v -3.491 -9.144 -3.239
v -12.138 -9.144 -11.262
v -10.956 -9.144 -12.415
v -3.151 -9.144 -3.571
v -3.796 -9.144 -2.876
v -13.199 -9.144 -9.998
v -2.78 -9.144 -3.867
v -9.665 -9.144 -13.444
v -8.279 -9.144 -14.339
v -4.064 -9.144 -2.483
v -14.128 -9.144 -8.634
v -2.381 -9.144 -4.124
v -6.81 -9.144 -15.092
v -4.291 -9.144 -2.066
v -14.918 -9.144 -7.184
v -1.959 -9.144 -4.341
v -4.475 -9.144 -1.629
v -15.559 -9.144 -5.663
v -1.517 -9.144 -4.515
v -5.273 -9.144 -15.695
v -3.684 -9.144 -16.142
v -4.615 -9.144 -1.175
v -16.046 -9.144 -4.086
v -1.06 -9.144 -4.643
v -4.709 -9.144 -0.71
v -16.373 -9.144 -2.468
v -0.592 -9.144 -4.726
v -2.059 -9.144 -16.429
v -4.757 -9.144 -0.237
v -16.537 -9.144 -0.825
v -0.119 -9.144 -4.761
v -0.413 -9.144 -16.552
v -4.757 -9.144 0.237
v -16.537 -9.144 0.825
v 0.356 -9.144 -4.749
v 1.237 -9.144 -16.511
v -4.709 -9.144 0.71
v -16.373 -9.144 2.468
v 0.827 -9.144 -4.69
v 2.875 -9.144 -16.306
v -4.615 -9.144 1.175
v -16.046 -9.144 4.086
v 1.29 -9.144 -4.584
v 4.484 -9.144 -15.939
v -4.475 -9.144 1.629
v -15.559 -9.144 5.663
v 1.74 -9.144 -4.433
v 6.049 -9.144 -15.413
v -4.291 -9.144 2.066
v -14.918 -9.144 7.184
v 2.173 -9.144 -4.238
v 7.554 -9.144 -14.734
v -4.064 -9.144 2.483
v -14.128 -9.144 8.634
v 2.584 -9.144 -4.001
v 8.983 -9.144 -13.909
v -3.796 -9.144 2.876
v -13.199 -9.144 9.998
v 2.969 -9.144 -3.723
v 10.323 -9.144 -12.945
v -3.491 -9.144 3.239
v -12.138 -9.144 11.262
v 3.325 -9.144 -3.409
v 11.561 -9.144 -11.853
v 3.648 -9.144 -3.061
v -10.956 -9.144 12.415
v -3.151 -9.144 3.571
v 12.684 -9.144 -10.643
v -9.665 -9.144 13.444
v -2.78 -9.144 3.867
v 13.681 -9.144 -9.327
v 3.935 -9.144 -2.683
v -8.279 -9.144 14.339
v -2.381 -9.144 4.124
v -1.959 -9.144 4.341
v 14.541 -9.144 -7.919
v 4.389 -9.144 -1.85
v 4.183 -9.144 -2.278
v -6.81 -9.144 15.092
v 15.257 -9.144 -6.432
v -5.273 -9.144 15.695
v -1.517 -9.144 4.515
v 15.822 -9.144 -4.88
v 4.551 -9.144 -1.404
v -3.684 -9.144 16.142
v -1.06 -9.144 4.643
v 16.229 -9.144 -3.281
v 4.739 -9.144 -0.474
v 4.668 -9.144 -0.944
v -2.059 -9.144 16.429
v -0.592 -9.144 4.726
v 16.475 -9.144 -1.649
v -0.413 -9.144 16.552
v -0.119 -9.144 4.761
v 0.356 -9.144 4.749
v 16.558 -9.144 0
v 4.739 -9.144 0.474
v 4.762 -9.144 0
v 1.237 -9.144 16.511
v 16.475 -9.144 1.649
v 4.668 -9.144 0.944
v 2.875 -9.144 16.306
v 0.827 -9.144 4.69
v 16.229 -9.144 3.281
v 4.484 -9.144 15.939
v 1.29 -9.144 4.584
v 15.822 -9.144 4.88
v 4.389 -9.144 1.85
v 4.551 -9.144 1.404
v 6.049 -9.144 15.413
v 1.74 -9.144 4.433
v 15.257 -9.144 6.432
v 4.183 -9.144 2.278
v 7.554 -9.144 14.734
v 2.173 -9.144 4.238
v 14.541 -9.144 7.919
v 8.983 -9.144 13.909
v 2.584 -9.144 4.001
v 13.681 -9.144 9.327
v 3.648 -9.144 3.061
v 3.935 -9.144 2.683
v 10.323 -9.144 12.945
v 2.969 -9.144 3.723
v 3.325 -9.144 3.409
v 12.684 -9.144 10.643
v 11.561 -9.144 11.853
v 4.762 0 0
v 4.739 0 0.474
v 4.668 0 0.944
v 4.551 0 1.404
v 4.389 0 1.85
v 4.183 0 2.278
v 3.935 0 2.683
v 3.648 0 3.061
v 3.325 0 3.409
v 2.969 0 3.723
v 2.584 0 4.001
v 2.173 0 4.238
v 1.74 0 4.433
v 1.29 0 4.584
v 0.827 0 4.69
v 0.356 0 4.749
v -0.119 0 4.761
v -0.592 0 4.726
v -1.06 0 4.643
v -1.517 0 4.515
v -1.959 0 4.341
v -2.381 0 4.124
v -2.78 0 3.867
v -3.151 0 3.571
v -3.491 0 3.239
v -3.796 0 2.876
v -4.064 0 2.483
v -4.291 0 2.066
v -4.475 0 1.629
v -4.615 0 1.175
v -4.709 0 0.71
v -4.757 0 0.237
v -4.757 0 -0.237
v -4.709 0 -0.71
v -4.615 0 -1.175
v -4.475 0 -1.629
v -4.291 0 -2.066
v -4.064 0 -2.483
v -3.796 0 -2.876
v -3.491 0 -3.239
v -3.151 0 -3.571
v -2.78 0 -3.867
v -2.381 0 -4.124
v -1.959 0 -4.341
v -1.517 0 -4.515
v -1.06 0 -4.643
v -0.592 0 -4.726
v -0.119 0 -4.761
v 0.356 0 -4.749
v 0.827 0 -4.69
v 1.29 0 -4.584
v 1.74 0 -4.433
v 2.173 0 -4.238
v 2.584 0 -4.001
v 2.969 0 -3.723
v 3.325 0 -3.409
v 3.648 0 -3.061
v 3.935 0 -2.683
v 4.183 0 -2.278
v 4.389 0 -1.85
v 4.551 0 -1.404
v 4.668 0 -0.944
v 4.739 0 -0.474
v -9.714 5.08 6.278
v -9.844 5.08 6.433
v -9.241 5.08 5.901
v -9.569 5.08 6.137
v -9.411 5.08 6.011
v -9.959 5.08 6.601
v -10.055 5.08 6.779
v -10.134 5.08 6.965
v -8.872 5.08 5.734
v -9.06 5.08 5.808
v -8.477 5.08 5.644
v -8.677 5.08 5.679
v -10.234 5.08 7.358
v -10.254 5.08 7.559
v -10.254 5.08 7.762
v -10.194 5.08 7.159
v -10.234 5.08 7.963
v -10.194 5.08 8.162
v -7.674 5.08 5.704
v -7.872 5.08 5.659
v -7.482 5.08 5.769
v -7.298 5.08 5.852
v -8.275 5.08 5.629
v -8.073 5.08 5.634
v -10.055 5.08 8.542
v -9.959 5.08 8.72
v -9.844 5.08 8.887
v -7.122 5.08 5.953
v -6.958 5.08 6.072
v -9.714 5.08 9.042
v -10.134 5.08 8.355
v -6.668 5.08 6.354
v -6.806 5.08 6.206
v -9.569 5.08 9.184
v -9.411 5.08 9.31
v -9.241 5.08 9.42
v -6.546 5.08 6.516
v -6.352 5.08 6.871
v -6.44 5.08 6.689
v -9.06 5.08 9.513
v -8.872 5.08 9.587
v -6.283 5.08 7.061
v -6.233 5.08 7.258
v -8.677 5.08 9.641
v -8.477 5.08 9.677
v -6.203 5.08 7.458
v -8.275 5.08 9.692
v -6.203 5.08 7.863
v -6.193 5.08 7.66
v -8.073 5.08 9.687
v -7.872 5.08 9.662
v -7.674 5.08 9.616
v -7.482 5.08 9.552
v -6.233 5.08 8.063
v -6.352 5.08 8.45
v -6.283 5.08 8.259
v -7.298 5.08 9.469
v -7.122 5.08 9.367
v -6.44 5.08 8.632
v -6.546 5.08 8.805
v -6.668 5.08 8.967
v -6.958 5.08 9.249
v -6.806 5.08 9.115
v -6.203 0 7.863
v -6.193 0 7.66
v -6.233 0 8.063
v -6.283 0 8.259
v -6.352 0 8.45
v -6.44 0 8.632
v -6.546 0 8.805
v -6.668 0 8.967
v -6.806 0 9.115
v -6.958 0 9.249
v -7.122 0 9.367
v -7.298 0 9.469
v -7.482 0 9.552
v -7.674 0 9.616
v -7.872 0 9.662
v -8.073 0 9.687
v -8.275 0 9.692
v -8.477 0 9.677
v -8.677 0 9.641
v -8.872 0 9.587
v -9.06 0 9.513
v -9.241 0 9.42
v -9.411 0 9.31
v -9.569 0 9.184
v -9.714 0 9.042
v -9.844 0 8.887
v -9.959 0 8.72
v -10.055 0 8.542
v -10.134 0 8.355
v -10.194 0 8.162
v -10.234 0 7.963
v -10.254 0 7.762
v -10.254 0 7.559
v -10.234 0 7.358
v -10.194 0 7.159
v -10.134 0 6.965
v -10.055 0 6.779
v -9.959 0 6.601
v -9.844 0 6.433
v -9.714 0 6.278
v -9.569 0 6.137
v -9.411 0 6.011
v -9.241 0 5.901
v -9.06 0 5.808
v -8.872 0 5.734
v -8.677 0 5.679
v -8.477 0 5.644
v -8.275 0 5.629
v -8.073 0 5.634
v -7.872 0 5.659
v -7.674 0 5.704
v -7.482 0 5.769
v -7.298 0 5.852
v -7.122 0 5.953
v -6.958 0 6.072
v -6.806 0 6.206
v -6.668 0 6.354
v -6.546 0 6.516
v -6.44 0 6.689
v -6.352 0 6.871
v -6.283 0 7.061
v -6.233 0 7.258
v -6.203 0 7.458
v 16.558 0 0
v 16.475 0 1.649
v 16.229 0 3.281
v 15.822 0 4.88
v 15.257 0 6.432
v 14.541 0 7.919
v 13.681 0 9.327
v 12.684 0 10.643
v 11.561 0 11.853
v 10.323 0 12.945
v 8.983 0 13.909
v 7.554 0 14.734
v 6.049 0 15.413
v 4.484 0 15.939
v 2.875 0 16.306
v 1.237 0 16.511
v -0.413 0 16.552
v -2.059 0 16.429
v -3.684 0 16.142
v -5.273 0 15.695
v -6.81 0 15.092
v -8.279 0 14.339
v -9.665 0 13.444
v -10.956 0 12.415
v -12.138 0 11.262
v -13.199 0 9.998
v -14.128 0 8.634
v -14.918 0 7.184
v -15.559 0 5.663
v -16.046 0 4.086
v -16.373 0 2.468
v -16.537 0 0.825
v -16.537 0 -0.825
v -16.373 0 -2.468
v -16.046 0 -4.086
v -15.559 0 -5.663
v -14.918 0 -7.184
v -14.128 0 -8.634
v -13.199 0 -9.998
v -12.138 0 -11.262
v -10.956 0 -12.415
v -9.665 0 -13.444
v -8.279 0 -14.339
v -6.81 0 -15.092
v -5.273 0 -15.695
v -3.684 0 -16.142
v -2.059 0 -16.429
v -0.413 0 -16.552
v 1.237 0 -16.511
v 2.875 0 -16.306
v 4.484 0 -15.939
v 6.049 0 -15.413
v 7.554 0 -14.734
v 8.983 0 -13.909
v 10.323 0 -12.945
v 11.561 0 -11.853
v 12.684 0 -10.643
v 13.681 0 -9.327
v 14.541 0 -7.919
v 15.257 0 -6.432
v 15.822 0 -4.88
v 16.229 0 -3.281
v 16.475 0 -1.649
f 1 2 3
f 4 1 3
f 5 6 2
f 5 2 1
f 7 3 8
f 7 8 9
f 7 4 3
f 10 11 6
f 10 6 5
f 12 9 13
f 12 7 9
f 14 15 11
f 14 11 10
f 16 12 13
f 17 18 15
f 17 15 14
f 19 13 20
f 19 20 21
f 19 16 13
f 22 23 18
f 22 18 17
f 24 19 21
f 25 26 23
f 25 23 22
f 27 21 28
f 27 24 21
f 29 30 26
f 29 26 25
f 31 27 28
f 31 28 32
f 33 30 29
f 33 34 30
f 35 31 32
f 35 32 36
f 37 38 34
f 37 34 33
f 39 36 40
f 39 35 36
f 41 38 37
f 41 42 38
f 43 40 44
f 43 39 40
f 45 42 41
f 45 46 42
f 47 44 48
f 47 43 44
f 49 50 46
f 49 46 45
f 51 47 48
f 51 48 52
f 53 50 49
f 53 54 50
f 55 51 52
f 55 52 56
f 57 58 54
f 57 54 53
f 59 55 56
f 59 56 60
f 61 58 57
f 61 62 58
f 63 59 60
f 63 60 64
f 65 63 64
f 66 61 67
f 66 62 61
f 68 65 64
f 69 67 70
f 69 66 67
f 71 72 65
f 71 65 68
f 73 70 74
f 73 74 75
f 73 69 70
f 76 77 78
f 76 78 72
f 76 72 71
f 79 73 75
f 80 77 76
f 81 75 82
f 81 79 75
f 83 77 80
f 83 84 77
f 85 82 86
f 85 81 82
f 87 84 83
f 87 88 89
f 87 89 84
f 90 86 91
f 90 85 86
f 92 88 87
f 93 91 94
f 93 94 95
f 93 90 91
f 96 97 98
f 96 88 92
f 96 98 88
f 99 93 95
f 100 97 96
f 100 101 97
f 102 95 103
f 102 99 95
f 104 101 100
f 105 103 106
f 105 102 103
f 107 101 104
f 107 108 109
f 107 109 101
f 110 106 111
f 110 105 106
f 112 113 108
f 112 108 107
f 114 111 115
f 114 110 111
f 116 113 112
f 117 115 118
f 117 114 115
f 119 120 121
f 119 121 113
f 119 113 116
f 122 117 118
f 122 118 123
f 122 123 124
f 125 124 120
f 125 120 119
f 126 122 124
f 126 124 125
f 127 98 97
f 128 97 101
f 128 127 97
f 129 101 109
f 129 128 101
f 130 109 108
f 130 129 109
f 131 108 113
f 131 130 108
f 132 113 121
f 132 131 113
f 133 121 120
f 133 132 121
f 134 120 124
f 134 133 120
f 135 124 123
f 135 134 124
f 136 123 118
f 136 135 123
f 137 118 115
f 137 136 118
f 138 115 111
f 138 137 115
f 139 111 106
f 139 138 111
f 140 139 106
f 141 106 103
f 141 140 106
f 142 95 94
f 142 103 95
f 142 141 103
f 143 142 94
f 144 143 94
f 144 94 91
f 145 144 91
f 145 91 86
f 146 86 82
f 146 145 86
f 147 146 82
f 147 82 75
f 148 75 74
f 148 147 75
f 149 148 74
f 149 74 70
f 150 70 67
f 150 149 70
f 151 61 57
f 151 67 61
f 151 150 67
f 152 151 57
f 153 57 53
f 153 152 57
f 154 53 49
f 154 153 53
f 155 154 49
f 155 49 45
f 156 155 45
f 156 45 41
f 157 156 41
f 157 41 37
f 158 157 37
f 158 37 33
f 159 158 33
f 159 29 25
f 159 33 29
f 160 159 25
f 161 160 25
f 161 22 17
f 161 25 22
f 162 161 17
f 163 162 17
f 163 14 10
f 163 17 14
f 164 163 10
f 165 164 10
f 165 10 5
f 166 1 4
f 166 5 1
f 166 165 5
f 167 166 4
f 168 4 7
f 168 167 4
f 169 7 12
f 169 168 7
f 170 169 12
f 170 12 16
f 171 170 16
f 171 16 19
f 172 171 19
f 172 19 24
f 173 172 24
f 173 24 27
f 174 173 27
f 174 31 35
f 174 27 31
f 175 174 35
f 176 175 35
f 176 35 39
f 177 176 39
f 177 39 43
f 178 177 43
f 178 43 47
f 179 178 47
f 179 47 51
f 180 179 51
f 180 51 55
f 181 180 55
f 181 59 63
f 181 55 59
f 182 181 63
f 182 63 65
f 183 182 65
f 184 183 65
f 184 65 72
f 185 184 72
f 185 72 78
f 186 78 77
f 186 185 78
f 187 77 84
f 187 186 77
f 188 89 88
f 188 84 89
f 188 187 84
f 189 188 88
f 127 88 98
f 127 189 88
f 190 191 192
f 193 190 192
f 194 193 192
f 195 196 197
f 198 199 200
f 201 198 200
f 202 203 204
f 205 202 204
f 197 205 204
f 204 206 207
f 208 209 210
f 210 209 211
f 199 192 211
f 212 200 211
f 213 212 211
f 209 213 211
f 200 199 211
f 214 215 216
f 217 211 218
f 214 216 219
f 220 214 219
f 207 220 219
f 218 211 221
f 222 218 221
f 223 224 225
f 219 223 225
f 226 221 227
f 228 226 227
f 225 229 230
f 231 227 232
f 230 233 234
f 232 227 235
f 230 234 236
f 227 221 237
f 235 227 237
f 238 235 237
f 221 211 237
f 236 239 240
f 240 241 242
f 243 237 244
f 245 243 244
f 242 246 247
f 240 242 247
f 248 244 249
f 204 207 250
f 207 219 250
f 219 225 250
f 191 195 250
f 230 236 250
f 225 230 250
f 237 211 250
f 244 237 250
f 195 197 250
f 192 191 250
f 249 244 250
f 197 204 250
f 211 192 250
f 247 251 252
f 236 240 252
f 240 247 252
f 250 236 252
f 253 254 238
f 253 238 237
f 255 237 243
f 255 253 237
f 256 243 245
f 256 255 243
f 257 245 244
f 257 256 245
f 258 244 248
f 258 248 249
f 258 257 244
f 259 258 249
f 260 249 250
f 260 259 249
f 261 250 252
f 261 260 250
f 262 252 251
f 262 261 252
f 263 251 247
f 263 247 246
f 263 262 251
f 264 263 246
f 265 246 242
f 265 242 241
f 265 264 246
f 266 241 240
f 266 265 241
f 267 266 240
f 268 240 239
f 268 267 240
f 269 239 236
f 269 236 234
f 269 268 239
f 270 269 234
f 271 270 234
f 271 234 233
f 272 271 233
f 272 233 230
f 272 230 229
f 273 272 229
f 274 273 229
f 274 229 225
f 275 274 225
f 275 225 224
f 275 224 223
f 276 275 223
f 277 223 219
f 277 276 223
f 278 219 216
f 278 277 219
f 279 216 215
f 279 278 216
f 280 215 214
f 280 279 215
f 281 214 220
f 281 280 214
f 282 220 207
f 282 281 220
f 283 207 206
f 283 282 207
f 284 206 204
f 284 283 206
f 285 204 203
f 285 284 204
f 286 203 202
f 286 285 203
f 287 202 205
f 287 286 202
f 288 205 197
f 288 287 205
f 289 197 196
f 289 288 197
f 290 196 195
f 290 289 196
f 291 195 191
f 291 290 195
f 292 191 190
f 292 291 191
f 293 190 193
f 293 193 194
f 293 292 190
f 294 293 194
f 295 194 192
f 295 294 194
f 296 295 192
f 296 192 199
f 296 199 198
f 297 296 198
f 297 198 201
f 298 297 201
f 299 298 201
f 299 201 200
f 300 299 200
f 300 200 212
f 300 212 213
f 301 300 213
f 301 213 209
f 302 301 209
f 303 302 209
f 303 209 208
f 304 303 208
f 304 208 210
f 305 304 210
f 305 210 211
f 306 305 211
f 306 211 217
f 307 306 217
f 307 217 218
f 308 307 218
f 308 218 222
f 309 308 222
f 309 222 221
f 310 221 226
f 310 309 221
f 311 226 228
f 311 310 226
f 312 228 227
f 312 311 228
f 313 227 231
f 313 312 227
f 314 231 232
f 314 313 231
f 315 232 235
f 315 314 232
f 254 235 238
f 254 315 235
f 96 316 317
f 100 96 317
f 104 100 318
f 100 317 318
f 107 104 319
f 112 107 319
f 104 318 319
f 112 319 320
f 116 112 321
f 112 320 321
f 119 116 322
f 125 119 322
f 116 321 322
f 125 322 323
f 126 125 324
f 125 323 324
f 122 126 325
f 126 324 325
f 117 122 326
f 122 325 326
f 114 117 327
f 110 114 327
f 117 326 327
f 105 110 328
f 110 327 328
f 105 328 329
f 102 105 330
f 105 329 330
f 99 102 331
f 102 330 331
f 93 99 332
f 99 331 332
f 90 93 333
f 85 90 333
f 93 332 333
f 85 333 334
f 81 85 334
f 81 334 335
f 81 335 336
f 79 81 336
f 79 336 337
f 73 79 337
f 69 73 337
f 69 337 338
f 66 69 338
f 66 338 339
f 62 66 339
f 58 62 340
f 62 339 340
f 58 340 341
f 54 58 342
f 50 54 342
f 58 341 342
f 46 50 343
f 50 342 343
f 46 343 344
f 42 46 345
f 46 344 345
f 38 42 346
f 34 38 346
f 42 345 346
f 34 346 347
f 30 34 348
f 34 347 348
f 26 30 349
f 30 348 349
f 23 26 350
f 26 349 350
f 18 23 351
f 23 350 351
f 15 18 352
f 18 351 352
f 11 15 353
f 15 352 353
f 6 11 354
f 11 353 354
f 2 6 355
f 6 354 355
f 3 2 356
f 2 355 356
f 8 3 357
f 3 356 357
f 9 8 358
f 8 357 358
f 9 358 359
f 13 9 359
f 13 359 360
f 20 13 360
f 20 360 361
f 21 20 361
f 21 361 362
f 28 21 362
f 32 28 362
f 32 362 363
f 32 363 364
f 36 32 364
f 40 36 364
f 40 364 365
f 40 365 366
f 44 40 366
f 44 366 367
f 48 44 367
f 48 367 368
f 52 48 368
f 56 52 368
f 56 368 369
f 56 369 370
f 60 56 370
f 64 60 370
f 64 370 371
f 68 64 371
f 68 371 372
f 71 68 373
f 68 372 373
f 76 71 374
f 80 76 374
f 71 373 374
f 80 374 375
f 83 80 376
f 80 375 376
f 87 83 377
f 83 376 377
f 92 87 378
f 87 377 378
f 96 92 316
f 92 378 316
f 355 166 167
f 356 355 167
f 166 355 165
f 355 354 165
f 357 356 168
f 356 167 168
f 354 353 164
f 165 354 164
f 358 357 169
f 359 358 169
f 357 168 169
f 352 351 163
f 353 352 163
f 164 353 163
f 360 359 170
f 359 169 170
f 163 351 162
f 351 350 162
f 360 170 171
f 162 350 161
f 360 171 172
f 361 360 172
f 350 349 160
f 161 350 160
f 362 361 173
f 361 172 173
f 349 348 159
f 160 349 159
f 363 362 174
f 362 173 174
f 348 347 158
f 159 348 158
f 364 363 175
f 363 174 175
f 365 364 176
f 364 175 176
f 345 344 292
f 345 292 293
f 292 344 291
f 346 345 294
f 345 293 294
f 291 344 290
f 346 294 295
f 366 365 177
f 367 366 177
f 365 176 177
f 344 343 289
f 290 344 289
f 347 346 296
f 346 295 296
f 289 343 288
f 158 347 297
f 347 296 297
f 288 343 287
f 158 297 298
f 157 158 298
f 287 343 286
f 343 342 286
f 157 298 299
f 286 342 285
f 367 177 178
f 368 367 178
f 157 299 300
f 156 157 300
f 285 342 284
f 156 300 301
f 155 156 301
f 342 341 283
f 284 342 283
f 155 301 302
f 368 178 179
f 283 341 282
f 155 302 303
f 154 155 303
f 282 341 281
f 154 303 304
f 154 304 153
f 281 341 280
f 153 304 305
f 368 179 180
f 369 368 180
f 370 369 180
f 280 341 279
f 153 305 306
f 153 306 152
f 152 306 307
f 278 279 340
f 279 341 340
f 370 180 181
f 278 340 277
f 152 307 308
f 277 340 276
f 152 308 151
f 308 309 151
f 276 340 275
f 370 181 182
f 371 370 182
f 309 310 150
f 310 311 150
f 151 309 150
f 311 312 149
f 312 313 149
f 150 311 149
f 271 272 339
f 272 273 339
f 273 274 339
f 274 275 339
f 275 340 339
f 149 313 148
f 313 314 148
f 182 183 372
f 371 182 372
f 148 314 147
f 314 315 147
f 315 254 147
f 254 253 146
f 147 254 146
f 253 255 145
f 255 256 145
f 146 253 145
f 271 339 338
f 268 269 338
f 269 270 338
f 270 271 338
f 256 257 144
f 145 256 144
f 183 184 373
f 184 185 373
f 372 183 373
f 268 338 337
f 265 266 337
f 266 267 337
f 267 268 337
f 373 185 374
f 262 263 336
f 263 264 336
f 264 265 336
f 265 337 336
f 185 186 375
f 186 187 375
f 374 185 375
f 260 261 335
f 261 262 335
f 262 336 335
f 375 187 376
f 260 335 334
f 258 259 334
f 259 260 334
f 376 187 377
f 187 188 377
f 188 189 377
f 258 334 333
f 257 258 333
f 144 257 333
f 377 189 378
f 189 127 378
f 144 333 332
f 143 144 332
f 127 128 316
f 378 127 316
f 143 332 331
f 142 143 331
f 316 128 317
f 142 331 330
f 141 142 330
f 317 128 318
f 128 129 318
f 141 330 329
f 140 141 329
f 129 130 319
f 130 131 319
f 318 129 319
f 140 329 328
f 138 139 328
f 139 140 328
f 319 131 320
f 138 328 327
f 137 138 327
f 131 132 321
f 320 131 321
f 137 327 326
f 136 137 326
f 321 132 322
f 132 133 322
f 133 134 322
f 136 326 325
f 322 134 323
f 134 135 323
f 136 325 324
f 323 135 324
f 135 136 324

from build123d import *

# Parameters (mm, degrees)
F0_R     = 16.557582
F0_R_2   = 2.032
F0_R_3   = 4.7625
F1_DEPTH = 9.144
F2_DEPTH = 5.08
F3_DEPTH = 24.638


with BuildPart() as f1:
    # F0 (on Front) → F1 (new body)
    with BuildSketch(Plane.XZ):
        Circle(F0_R)
        with Locations((-8.22466, 7.660374)):
            Circle(F0_R_2, mode=Mode.SUBTRACT)
        Circle(F0_R_3, mode=Mode.SUBTRACT)
        Circle(F0_R_3)
        with Locations((-8.22466, 7.660374)):
            Circle(F0_R_2)
    extrude(amount=F1_DEPTH)

    # F0 (on Front) → F2 (join)
    with BuildSketch(Plane.XZ):
        with Locations((-8.22466, 7.660374)):
            Circle(F0_R_2)
    extrude(amount=-F2_DEPTH)

    # F0 (on Front) → F3 (cut)
    with BuildSketch(Plane.XZ):
        Circle(F0_R_3)
    extrude(amount=F3_DEPTH, mode=Mode.SUBTRACT)


solid = f1.part
